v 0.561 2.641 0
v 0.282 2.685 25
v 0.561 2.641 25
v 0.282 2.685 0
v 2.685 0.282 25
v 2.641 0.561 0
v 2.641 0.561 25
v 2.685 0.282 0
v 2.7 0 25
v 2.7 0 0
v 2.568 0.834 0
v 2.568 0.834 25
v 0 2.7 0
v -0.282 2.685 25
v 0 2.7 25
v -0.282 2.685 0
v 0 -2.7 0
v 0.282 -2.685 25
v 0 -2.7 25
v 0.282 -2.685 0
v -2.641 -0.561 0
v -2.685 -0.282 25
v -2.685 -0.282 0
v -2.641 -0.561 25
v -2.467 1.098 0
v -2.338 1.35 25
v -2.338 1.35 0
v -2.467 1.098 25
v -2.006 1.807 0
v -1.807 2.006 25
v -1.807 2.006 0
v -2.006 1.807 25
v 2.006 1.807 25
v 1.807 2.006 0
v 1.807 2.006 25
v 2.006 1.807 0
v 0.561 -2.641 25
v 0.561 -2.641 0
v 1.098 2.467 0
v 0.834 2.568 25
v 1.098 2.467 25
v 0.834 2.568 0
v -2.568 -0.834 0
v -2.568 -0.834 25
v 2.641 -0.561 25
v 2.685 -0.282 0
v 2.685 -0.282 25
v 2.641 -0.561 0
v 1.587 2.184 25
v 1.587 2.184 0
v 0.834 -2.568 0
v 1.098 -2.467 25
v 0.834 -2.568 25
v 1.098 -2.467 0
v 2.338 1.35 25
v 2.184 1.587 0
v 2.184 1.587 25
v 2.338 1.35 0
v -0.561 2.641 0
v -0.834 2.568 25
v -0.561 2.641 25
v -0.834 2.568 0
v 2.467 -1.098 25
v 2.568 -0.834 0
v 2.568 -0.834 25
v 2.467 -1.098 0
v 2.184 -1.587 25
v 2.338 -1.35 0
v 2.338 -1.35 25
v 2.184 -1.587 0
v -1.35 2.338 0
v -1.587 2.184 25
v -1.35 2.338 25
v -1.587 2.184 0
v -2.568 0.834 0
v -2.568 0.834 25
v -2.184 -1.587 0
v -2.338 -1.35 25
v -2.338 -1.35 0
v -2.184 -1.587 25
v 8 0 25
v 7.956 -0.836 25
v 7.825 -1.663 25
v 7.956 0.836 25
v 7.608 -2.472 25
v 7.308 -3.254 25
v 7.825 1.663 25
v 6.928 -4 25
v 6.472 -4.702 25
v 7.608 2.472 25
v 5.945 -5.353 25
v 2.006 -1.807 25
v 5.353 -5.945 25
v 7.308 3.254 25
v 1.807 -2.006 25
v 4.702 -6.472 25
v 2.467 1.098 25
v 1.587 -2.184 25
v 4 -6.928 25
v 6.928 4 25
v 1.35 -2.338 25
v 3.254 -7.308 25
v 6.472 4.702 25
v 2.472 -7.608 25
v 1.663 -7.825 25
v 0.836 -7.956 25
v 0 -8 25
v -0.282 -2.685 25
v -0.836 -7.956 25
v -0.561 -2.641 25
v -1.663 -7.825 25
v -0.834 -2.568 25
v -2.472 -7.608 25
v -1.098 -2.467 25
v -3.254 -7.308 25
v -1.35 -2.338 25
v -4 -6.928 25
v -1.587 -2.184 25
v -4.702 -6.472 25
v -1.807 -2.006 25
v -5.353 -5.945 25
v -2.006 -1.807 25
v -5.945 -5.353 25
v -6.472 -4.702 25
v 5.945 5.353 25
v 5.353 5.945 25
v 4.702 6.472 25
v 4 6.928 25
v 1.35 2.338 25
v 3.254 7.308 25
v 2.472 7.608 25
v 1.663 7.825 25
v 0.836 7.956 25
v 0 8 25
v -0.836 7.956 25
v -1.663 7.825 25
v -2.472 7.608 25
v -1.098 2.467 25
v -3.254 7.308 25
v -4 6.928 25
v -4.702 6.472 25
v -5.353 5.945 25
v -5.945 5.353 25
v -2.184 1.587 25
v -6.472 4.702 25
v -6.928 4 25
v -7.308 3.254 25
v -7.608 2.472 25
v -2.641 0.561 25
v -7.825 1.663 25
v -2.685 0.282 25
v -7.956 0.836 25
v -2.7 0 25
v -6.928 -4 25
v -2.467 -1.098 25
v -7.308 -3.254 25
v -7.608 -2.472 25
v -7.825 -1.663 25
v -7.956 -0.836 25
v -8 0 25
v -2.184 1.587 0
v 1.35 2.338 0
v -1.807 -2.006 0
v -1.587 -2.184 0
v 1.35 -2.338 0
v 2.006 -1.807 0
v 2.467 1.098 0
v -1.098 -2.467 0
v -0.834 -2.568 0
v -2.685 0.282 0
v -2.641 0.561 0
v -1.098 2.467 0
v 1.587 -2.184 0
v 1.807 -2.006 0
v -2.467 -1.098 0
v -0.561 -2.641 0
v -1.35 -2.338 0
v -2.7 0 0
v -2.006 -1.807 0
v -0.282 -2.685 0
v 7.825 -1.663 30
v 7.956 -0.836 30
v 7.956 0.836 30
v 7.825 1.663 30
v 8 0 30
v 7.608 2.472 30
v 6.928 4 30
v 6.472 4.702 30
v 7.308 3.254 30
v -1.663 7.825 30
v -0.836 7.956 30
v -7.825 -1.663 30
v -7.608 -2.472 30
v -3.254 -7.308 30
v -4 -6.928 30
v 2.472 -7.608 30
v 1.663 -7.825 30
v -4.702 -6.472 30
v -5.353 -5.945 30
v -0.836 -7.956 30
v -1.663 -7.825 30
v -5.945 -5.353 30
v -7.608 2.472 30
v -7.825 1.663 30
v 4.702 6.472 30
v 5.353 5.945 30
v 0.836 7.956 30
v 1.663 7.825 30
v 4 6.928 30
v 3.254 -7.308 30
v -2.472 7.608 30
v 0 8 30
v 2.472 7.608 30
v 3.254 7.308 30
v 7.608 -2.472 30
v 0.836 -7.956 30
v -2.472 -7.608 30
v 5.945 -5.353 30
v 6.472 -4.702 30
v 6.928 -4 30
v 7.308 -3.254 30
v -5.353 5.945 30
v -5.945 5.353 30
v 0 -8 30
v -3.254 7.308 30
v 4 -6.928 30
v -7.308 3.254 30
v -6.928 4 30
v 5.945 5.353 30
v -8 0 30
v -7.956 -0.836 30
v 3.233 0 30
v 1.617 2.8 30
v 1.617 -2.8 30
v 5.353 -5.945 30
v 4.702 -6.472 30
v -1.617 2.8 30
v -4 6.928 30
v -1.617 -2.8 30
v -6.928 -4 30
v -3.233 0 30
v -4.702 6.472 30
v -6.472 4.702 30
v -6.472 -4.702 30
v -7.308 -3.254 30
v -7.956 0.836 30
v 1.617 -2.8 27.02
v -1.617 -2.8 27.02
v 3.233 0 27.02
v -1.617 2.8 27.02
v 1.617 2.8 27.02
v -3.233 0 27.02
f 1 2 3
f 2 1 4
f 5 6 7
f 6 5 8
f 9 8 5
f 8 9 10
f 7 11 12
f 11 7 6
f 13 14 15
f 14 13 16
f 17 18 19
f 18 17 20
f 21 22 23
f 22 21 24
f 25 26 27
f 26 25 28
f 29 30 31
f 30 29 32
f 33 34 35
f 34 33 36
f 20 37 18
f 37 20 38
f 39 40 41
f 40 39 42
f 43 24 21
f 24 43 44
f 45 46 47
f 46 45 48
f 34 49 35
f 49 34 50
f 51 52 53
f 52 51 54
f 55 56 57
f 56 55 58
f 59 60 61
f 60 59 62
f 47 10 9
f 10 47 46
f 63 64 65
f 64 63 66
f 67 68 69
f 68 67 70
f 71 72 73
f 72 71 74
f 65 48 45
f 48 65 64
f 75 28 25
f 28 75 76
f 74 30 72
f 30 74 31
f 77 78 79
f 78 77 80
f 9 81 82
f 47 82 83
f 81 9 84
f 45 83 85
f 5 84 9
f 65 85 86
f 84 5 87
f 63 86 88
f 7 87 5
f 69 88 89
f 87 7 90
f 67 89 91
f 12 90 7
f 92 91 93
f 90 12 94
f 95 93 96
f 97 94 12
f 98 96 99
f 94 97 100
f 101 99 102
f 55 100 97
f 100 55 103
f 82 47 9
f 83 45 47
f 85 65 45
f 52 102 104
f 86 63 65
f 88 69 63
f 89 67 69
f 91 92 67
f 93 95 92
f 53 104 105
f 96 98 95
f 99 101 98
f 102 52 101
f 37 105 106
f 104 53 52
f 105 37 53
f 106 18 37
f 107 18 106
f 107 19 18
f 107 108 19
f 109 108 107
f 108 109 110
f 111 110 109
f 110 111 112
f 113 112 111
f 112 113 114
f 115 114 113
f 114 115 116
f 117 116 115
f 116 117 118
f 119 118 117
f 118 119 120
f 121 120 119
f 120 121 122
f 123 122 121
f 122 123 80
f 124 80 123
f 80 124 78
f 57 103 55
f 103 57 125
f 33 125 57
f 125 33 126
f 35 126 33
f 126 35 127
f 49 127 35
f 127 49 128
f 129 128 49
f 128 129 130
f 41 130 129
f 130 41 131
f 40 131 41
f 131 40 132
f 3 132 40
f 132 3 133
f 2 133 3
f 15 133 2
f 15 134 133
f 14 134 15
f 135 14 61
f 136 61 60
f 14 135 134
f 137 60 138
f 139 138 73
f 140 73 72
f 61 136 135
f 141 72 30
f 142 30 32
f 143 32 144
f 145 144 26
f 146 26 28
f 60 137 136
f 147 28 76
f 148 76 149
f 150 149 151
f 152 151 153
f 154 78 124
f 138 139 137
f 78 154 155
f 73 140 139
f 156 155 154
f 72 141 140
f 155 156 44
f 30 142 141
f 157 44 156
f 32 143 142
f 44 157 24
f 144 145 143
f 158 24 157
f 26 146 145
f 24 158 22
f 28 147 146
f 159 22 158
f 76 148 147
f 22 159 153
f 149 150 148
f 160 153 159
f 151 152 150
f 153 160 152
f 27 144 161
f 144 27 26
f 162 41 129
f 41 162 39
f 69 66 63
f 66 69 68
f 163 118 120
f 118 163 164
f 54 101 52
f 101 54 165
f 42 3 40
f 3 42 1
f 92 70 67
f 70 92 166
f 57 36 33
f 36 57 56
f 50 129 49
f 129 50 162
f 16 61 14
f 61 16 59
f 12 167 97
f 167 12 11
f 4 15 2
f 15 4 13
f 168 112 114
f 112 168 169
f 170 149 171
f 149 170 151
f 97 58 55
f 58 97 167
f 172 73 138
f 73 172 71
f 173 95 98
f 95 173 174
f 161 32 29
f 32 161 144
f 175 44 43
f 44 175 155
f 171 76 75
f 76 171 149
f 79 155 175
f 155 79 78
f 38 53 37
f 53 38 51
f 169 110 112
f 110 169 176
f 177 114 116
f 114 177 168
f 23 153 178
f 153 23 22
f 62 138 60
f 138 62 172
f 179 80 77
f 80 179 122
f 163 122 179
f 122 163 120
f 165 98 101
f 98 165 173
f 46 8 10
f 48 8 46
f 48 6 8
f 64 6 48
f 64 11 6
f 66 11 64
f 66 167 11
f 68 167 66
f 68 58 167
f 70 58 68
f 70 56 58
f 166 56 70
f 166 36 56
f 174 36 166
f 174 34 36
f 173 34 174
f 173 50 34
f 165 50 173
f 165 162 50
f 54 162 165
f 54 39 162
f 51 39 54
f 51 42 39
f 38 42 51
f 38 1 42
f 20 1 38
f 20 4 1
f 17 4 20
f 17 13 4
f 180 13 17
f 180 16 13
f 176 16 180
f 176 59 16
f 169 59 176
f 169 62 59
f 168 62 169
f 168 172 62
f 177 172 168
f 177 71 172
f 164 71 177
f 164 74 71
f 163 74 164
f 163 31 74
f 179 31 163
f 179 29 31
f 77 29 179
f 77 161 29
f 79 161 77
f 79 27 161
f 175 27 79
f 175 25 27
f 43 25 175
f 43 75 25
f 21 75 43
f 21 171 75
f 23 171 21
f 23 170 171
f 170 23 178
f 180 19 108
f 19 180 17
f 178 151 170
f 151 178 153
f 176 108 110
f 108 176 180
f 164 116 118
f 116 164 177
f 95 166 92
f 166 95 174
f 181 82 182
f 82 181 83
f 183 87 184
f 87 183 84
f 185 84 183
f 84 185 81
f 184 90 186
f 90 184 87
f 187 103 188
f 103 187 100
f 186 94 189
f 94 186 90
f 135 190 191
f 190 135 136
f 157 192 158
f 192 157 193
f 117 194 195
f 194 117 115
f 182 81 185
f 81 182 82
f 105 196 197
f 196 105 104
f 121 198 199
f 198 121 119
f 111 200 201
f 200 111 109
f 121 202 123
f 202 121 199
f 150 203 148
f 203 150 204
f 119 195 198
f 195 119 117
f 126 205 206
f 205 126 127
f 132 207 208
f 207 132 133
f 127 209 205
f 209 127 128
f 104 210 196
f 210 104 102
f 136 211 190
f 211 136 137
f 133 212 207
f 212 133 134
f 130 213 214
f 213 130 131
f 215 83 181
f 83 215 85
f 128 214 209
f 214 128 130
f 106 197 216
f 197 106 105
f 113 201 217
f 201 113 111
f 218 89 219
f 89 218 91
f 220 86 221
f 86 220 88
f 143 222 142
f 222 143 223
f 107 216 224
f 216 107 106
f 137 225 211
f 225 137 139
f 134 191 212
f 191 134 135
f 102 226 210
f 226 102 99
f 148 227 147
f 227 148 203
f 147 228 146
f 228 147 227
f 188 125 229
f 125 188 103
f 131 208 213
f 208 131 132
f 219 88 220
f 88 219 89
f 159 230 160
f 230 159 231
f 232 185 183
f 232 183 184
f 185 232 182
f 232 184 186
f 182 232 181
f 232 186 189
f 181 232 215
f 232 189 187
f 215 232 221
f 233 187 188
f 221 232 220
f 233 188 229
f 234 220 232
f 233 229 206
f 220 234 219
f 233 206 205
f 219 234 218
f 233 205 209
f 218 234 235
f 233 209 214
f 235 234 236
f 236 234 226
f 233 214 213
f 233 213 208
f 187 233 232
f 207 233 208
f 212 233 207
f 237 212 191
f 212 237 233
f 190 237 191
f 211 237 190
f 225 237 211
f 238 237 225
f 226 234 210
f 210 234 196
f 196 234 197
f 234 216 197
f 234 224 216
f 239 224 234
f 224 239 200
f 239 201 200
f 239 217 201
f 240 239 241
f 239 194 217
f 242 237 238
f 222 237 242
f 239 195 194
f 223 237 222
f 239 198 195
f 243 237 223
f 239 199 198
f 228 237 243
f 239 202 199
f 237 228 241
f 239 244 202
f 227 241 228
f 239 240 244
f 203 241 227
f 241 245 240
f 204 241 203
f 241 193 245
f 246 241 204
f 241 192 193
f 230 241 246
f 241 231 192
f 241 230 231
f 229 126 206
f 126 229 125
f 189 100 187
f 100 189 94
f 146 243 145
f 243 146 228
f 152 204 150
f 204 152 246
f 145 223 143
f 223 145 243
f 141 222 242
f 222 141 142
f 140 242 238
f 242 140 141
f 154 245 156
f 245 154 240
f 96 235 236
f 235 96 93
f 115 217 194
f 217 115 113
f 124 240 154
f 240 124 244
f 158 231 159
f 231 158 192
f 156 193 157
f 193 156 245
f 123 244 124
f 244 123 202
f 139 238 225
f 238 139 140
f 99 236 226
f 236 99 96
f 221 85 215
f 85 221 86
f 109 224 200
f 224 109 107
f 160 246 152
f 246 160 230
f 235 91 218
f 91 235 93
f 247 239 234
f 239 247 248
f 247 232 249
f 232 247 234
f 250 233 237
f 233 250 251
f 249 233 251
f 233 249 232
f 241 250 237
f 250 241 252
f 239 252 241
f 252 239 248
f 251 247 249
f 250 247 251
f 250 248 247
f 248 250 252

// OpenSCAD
// Thumb screw, smooth-shank representation.
$fn = 60;
eps = 0.02;
shaft_d = 5.4;
head_d = 16;
shaft_l = 25;
head_h = 5;
difference() {
    union() { cylinder(d = shaft_d, h = shaft_l); translate([0, 0, shaft_l]) cylinder(d = head_d, h = head_h); }
    translate([0, 0, shaft_l + head_h - 3 + eps]) cylinder(d = head_d * 0.35 / cos(30), h = 3 + eps, $fn = 6);
}
